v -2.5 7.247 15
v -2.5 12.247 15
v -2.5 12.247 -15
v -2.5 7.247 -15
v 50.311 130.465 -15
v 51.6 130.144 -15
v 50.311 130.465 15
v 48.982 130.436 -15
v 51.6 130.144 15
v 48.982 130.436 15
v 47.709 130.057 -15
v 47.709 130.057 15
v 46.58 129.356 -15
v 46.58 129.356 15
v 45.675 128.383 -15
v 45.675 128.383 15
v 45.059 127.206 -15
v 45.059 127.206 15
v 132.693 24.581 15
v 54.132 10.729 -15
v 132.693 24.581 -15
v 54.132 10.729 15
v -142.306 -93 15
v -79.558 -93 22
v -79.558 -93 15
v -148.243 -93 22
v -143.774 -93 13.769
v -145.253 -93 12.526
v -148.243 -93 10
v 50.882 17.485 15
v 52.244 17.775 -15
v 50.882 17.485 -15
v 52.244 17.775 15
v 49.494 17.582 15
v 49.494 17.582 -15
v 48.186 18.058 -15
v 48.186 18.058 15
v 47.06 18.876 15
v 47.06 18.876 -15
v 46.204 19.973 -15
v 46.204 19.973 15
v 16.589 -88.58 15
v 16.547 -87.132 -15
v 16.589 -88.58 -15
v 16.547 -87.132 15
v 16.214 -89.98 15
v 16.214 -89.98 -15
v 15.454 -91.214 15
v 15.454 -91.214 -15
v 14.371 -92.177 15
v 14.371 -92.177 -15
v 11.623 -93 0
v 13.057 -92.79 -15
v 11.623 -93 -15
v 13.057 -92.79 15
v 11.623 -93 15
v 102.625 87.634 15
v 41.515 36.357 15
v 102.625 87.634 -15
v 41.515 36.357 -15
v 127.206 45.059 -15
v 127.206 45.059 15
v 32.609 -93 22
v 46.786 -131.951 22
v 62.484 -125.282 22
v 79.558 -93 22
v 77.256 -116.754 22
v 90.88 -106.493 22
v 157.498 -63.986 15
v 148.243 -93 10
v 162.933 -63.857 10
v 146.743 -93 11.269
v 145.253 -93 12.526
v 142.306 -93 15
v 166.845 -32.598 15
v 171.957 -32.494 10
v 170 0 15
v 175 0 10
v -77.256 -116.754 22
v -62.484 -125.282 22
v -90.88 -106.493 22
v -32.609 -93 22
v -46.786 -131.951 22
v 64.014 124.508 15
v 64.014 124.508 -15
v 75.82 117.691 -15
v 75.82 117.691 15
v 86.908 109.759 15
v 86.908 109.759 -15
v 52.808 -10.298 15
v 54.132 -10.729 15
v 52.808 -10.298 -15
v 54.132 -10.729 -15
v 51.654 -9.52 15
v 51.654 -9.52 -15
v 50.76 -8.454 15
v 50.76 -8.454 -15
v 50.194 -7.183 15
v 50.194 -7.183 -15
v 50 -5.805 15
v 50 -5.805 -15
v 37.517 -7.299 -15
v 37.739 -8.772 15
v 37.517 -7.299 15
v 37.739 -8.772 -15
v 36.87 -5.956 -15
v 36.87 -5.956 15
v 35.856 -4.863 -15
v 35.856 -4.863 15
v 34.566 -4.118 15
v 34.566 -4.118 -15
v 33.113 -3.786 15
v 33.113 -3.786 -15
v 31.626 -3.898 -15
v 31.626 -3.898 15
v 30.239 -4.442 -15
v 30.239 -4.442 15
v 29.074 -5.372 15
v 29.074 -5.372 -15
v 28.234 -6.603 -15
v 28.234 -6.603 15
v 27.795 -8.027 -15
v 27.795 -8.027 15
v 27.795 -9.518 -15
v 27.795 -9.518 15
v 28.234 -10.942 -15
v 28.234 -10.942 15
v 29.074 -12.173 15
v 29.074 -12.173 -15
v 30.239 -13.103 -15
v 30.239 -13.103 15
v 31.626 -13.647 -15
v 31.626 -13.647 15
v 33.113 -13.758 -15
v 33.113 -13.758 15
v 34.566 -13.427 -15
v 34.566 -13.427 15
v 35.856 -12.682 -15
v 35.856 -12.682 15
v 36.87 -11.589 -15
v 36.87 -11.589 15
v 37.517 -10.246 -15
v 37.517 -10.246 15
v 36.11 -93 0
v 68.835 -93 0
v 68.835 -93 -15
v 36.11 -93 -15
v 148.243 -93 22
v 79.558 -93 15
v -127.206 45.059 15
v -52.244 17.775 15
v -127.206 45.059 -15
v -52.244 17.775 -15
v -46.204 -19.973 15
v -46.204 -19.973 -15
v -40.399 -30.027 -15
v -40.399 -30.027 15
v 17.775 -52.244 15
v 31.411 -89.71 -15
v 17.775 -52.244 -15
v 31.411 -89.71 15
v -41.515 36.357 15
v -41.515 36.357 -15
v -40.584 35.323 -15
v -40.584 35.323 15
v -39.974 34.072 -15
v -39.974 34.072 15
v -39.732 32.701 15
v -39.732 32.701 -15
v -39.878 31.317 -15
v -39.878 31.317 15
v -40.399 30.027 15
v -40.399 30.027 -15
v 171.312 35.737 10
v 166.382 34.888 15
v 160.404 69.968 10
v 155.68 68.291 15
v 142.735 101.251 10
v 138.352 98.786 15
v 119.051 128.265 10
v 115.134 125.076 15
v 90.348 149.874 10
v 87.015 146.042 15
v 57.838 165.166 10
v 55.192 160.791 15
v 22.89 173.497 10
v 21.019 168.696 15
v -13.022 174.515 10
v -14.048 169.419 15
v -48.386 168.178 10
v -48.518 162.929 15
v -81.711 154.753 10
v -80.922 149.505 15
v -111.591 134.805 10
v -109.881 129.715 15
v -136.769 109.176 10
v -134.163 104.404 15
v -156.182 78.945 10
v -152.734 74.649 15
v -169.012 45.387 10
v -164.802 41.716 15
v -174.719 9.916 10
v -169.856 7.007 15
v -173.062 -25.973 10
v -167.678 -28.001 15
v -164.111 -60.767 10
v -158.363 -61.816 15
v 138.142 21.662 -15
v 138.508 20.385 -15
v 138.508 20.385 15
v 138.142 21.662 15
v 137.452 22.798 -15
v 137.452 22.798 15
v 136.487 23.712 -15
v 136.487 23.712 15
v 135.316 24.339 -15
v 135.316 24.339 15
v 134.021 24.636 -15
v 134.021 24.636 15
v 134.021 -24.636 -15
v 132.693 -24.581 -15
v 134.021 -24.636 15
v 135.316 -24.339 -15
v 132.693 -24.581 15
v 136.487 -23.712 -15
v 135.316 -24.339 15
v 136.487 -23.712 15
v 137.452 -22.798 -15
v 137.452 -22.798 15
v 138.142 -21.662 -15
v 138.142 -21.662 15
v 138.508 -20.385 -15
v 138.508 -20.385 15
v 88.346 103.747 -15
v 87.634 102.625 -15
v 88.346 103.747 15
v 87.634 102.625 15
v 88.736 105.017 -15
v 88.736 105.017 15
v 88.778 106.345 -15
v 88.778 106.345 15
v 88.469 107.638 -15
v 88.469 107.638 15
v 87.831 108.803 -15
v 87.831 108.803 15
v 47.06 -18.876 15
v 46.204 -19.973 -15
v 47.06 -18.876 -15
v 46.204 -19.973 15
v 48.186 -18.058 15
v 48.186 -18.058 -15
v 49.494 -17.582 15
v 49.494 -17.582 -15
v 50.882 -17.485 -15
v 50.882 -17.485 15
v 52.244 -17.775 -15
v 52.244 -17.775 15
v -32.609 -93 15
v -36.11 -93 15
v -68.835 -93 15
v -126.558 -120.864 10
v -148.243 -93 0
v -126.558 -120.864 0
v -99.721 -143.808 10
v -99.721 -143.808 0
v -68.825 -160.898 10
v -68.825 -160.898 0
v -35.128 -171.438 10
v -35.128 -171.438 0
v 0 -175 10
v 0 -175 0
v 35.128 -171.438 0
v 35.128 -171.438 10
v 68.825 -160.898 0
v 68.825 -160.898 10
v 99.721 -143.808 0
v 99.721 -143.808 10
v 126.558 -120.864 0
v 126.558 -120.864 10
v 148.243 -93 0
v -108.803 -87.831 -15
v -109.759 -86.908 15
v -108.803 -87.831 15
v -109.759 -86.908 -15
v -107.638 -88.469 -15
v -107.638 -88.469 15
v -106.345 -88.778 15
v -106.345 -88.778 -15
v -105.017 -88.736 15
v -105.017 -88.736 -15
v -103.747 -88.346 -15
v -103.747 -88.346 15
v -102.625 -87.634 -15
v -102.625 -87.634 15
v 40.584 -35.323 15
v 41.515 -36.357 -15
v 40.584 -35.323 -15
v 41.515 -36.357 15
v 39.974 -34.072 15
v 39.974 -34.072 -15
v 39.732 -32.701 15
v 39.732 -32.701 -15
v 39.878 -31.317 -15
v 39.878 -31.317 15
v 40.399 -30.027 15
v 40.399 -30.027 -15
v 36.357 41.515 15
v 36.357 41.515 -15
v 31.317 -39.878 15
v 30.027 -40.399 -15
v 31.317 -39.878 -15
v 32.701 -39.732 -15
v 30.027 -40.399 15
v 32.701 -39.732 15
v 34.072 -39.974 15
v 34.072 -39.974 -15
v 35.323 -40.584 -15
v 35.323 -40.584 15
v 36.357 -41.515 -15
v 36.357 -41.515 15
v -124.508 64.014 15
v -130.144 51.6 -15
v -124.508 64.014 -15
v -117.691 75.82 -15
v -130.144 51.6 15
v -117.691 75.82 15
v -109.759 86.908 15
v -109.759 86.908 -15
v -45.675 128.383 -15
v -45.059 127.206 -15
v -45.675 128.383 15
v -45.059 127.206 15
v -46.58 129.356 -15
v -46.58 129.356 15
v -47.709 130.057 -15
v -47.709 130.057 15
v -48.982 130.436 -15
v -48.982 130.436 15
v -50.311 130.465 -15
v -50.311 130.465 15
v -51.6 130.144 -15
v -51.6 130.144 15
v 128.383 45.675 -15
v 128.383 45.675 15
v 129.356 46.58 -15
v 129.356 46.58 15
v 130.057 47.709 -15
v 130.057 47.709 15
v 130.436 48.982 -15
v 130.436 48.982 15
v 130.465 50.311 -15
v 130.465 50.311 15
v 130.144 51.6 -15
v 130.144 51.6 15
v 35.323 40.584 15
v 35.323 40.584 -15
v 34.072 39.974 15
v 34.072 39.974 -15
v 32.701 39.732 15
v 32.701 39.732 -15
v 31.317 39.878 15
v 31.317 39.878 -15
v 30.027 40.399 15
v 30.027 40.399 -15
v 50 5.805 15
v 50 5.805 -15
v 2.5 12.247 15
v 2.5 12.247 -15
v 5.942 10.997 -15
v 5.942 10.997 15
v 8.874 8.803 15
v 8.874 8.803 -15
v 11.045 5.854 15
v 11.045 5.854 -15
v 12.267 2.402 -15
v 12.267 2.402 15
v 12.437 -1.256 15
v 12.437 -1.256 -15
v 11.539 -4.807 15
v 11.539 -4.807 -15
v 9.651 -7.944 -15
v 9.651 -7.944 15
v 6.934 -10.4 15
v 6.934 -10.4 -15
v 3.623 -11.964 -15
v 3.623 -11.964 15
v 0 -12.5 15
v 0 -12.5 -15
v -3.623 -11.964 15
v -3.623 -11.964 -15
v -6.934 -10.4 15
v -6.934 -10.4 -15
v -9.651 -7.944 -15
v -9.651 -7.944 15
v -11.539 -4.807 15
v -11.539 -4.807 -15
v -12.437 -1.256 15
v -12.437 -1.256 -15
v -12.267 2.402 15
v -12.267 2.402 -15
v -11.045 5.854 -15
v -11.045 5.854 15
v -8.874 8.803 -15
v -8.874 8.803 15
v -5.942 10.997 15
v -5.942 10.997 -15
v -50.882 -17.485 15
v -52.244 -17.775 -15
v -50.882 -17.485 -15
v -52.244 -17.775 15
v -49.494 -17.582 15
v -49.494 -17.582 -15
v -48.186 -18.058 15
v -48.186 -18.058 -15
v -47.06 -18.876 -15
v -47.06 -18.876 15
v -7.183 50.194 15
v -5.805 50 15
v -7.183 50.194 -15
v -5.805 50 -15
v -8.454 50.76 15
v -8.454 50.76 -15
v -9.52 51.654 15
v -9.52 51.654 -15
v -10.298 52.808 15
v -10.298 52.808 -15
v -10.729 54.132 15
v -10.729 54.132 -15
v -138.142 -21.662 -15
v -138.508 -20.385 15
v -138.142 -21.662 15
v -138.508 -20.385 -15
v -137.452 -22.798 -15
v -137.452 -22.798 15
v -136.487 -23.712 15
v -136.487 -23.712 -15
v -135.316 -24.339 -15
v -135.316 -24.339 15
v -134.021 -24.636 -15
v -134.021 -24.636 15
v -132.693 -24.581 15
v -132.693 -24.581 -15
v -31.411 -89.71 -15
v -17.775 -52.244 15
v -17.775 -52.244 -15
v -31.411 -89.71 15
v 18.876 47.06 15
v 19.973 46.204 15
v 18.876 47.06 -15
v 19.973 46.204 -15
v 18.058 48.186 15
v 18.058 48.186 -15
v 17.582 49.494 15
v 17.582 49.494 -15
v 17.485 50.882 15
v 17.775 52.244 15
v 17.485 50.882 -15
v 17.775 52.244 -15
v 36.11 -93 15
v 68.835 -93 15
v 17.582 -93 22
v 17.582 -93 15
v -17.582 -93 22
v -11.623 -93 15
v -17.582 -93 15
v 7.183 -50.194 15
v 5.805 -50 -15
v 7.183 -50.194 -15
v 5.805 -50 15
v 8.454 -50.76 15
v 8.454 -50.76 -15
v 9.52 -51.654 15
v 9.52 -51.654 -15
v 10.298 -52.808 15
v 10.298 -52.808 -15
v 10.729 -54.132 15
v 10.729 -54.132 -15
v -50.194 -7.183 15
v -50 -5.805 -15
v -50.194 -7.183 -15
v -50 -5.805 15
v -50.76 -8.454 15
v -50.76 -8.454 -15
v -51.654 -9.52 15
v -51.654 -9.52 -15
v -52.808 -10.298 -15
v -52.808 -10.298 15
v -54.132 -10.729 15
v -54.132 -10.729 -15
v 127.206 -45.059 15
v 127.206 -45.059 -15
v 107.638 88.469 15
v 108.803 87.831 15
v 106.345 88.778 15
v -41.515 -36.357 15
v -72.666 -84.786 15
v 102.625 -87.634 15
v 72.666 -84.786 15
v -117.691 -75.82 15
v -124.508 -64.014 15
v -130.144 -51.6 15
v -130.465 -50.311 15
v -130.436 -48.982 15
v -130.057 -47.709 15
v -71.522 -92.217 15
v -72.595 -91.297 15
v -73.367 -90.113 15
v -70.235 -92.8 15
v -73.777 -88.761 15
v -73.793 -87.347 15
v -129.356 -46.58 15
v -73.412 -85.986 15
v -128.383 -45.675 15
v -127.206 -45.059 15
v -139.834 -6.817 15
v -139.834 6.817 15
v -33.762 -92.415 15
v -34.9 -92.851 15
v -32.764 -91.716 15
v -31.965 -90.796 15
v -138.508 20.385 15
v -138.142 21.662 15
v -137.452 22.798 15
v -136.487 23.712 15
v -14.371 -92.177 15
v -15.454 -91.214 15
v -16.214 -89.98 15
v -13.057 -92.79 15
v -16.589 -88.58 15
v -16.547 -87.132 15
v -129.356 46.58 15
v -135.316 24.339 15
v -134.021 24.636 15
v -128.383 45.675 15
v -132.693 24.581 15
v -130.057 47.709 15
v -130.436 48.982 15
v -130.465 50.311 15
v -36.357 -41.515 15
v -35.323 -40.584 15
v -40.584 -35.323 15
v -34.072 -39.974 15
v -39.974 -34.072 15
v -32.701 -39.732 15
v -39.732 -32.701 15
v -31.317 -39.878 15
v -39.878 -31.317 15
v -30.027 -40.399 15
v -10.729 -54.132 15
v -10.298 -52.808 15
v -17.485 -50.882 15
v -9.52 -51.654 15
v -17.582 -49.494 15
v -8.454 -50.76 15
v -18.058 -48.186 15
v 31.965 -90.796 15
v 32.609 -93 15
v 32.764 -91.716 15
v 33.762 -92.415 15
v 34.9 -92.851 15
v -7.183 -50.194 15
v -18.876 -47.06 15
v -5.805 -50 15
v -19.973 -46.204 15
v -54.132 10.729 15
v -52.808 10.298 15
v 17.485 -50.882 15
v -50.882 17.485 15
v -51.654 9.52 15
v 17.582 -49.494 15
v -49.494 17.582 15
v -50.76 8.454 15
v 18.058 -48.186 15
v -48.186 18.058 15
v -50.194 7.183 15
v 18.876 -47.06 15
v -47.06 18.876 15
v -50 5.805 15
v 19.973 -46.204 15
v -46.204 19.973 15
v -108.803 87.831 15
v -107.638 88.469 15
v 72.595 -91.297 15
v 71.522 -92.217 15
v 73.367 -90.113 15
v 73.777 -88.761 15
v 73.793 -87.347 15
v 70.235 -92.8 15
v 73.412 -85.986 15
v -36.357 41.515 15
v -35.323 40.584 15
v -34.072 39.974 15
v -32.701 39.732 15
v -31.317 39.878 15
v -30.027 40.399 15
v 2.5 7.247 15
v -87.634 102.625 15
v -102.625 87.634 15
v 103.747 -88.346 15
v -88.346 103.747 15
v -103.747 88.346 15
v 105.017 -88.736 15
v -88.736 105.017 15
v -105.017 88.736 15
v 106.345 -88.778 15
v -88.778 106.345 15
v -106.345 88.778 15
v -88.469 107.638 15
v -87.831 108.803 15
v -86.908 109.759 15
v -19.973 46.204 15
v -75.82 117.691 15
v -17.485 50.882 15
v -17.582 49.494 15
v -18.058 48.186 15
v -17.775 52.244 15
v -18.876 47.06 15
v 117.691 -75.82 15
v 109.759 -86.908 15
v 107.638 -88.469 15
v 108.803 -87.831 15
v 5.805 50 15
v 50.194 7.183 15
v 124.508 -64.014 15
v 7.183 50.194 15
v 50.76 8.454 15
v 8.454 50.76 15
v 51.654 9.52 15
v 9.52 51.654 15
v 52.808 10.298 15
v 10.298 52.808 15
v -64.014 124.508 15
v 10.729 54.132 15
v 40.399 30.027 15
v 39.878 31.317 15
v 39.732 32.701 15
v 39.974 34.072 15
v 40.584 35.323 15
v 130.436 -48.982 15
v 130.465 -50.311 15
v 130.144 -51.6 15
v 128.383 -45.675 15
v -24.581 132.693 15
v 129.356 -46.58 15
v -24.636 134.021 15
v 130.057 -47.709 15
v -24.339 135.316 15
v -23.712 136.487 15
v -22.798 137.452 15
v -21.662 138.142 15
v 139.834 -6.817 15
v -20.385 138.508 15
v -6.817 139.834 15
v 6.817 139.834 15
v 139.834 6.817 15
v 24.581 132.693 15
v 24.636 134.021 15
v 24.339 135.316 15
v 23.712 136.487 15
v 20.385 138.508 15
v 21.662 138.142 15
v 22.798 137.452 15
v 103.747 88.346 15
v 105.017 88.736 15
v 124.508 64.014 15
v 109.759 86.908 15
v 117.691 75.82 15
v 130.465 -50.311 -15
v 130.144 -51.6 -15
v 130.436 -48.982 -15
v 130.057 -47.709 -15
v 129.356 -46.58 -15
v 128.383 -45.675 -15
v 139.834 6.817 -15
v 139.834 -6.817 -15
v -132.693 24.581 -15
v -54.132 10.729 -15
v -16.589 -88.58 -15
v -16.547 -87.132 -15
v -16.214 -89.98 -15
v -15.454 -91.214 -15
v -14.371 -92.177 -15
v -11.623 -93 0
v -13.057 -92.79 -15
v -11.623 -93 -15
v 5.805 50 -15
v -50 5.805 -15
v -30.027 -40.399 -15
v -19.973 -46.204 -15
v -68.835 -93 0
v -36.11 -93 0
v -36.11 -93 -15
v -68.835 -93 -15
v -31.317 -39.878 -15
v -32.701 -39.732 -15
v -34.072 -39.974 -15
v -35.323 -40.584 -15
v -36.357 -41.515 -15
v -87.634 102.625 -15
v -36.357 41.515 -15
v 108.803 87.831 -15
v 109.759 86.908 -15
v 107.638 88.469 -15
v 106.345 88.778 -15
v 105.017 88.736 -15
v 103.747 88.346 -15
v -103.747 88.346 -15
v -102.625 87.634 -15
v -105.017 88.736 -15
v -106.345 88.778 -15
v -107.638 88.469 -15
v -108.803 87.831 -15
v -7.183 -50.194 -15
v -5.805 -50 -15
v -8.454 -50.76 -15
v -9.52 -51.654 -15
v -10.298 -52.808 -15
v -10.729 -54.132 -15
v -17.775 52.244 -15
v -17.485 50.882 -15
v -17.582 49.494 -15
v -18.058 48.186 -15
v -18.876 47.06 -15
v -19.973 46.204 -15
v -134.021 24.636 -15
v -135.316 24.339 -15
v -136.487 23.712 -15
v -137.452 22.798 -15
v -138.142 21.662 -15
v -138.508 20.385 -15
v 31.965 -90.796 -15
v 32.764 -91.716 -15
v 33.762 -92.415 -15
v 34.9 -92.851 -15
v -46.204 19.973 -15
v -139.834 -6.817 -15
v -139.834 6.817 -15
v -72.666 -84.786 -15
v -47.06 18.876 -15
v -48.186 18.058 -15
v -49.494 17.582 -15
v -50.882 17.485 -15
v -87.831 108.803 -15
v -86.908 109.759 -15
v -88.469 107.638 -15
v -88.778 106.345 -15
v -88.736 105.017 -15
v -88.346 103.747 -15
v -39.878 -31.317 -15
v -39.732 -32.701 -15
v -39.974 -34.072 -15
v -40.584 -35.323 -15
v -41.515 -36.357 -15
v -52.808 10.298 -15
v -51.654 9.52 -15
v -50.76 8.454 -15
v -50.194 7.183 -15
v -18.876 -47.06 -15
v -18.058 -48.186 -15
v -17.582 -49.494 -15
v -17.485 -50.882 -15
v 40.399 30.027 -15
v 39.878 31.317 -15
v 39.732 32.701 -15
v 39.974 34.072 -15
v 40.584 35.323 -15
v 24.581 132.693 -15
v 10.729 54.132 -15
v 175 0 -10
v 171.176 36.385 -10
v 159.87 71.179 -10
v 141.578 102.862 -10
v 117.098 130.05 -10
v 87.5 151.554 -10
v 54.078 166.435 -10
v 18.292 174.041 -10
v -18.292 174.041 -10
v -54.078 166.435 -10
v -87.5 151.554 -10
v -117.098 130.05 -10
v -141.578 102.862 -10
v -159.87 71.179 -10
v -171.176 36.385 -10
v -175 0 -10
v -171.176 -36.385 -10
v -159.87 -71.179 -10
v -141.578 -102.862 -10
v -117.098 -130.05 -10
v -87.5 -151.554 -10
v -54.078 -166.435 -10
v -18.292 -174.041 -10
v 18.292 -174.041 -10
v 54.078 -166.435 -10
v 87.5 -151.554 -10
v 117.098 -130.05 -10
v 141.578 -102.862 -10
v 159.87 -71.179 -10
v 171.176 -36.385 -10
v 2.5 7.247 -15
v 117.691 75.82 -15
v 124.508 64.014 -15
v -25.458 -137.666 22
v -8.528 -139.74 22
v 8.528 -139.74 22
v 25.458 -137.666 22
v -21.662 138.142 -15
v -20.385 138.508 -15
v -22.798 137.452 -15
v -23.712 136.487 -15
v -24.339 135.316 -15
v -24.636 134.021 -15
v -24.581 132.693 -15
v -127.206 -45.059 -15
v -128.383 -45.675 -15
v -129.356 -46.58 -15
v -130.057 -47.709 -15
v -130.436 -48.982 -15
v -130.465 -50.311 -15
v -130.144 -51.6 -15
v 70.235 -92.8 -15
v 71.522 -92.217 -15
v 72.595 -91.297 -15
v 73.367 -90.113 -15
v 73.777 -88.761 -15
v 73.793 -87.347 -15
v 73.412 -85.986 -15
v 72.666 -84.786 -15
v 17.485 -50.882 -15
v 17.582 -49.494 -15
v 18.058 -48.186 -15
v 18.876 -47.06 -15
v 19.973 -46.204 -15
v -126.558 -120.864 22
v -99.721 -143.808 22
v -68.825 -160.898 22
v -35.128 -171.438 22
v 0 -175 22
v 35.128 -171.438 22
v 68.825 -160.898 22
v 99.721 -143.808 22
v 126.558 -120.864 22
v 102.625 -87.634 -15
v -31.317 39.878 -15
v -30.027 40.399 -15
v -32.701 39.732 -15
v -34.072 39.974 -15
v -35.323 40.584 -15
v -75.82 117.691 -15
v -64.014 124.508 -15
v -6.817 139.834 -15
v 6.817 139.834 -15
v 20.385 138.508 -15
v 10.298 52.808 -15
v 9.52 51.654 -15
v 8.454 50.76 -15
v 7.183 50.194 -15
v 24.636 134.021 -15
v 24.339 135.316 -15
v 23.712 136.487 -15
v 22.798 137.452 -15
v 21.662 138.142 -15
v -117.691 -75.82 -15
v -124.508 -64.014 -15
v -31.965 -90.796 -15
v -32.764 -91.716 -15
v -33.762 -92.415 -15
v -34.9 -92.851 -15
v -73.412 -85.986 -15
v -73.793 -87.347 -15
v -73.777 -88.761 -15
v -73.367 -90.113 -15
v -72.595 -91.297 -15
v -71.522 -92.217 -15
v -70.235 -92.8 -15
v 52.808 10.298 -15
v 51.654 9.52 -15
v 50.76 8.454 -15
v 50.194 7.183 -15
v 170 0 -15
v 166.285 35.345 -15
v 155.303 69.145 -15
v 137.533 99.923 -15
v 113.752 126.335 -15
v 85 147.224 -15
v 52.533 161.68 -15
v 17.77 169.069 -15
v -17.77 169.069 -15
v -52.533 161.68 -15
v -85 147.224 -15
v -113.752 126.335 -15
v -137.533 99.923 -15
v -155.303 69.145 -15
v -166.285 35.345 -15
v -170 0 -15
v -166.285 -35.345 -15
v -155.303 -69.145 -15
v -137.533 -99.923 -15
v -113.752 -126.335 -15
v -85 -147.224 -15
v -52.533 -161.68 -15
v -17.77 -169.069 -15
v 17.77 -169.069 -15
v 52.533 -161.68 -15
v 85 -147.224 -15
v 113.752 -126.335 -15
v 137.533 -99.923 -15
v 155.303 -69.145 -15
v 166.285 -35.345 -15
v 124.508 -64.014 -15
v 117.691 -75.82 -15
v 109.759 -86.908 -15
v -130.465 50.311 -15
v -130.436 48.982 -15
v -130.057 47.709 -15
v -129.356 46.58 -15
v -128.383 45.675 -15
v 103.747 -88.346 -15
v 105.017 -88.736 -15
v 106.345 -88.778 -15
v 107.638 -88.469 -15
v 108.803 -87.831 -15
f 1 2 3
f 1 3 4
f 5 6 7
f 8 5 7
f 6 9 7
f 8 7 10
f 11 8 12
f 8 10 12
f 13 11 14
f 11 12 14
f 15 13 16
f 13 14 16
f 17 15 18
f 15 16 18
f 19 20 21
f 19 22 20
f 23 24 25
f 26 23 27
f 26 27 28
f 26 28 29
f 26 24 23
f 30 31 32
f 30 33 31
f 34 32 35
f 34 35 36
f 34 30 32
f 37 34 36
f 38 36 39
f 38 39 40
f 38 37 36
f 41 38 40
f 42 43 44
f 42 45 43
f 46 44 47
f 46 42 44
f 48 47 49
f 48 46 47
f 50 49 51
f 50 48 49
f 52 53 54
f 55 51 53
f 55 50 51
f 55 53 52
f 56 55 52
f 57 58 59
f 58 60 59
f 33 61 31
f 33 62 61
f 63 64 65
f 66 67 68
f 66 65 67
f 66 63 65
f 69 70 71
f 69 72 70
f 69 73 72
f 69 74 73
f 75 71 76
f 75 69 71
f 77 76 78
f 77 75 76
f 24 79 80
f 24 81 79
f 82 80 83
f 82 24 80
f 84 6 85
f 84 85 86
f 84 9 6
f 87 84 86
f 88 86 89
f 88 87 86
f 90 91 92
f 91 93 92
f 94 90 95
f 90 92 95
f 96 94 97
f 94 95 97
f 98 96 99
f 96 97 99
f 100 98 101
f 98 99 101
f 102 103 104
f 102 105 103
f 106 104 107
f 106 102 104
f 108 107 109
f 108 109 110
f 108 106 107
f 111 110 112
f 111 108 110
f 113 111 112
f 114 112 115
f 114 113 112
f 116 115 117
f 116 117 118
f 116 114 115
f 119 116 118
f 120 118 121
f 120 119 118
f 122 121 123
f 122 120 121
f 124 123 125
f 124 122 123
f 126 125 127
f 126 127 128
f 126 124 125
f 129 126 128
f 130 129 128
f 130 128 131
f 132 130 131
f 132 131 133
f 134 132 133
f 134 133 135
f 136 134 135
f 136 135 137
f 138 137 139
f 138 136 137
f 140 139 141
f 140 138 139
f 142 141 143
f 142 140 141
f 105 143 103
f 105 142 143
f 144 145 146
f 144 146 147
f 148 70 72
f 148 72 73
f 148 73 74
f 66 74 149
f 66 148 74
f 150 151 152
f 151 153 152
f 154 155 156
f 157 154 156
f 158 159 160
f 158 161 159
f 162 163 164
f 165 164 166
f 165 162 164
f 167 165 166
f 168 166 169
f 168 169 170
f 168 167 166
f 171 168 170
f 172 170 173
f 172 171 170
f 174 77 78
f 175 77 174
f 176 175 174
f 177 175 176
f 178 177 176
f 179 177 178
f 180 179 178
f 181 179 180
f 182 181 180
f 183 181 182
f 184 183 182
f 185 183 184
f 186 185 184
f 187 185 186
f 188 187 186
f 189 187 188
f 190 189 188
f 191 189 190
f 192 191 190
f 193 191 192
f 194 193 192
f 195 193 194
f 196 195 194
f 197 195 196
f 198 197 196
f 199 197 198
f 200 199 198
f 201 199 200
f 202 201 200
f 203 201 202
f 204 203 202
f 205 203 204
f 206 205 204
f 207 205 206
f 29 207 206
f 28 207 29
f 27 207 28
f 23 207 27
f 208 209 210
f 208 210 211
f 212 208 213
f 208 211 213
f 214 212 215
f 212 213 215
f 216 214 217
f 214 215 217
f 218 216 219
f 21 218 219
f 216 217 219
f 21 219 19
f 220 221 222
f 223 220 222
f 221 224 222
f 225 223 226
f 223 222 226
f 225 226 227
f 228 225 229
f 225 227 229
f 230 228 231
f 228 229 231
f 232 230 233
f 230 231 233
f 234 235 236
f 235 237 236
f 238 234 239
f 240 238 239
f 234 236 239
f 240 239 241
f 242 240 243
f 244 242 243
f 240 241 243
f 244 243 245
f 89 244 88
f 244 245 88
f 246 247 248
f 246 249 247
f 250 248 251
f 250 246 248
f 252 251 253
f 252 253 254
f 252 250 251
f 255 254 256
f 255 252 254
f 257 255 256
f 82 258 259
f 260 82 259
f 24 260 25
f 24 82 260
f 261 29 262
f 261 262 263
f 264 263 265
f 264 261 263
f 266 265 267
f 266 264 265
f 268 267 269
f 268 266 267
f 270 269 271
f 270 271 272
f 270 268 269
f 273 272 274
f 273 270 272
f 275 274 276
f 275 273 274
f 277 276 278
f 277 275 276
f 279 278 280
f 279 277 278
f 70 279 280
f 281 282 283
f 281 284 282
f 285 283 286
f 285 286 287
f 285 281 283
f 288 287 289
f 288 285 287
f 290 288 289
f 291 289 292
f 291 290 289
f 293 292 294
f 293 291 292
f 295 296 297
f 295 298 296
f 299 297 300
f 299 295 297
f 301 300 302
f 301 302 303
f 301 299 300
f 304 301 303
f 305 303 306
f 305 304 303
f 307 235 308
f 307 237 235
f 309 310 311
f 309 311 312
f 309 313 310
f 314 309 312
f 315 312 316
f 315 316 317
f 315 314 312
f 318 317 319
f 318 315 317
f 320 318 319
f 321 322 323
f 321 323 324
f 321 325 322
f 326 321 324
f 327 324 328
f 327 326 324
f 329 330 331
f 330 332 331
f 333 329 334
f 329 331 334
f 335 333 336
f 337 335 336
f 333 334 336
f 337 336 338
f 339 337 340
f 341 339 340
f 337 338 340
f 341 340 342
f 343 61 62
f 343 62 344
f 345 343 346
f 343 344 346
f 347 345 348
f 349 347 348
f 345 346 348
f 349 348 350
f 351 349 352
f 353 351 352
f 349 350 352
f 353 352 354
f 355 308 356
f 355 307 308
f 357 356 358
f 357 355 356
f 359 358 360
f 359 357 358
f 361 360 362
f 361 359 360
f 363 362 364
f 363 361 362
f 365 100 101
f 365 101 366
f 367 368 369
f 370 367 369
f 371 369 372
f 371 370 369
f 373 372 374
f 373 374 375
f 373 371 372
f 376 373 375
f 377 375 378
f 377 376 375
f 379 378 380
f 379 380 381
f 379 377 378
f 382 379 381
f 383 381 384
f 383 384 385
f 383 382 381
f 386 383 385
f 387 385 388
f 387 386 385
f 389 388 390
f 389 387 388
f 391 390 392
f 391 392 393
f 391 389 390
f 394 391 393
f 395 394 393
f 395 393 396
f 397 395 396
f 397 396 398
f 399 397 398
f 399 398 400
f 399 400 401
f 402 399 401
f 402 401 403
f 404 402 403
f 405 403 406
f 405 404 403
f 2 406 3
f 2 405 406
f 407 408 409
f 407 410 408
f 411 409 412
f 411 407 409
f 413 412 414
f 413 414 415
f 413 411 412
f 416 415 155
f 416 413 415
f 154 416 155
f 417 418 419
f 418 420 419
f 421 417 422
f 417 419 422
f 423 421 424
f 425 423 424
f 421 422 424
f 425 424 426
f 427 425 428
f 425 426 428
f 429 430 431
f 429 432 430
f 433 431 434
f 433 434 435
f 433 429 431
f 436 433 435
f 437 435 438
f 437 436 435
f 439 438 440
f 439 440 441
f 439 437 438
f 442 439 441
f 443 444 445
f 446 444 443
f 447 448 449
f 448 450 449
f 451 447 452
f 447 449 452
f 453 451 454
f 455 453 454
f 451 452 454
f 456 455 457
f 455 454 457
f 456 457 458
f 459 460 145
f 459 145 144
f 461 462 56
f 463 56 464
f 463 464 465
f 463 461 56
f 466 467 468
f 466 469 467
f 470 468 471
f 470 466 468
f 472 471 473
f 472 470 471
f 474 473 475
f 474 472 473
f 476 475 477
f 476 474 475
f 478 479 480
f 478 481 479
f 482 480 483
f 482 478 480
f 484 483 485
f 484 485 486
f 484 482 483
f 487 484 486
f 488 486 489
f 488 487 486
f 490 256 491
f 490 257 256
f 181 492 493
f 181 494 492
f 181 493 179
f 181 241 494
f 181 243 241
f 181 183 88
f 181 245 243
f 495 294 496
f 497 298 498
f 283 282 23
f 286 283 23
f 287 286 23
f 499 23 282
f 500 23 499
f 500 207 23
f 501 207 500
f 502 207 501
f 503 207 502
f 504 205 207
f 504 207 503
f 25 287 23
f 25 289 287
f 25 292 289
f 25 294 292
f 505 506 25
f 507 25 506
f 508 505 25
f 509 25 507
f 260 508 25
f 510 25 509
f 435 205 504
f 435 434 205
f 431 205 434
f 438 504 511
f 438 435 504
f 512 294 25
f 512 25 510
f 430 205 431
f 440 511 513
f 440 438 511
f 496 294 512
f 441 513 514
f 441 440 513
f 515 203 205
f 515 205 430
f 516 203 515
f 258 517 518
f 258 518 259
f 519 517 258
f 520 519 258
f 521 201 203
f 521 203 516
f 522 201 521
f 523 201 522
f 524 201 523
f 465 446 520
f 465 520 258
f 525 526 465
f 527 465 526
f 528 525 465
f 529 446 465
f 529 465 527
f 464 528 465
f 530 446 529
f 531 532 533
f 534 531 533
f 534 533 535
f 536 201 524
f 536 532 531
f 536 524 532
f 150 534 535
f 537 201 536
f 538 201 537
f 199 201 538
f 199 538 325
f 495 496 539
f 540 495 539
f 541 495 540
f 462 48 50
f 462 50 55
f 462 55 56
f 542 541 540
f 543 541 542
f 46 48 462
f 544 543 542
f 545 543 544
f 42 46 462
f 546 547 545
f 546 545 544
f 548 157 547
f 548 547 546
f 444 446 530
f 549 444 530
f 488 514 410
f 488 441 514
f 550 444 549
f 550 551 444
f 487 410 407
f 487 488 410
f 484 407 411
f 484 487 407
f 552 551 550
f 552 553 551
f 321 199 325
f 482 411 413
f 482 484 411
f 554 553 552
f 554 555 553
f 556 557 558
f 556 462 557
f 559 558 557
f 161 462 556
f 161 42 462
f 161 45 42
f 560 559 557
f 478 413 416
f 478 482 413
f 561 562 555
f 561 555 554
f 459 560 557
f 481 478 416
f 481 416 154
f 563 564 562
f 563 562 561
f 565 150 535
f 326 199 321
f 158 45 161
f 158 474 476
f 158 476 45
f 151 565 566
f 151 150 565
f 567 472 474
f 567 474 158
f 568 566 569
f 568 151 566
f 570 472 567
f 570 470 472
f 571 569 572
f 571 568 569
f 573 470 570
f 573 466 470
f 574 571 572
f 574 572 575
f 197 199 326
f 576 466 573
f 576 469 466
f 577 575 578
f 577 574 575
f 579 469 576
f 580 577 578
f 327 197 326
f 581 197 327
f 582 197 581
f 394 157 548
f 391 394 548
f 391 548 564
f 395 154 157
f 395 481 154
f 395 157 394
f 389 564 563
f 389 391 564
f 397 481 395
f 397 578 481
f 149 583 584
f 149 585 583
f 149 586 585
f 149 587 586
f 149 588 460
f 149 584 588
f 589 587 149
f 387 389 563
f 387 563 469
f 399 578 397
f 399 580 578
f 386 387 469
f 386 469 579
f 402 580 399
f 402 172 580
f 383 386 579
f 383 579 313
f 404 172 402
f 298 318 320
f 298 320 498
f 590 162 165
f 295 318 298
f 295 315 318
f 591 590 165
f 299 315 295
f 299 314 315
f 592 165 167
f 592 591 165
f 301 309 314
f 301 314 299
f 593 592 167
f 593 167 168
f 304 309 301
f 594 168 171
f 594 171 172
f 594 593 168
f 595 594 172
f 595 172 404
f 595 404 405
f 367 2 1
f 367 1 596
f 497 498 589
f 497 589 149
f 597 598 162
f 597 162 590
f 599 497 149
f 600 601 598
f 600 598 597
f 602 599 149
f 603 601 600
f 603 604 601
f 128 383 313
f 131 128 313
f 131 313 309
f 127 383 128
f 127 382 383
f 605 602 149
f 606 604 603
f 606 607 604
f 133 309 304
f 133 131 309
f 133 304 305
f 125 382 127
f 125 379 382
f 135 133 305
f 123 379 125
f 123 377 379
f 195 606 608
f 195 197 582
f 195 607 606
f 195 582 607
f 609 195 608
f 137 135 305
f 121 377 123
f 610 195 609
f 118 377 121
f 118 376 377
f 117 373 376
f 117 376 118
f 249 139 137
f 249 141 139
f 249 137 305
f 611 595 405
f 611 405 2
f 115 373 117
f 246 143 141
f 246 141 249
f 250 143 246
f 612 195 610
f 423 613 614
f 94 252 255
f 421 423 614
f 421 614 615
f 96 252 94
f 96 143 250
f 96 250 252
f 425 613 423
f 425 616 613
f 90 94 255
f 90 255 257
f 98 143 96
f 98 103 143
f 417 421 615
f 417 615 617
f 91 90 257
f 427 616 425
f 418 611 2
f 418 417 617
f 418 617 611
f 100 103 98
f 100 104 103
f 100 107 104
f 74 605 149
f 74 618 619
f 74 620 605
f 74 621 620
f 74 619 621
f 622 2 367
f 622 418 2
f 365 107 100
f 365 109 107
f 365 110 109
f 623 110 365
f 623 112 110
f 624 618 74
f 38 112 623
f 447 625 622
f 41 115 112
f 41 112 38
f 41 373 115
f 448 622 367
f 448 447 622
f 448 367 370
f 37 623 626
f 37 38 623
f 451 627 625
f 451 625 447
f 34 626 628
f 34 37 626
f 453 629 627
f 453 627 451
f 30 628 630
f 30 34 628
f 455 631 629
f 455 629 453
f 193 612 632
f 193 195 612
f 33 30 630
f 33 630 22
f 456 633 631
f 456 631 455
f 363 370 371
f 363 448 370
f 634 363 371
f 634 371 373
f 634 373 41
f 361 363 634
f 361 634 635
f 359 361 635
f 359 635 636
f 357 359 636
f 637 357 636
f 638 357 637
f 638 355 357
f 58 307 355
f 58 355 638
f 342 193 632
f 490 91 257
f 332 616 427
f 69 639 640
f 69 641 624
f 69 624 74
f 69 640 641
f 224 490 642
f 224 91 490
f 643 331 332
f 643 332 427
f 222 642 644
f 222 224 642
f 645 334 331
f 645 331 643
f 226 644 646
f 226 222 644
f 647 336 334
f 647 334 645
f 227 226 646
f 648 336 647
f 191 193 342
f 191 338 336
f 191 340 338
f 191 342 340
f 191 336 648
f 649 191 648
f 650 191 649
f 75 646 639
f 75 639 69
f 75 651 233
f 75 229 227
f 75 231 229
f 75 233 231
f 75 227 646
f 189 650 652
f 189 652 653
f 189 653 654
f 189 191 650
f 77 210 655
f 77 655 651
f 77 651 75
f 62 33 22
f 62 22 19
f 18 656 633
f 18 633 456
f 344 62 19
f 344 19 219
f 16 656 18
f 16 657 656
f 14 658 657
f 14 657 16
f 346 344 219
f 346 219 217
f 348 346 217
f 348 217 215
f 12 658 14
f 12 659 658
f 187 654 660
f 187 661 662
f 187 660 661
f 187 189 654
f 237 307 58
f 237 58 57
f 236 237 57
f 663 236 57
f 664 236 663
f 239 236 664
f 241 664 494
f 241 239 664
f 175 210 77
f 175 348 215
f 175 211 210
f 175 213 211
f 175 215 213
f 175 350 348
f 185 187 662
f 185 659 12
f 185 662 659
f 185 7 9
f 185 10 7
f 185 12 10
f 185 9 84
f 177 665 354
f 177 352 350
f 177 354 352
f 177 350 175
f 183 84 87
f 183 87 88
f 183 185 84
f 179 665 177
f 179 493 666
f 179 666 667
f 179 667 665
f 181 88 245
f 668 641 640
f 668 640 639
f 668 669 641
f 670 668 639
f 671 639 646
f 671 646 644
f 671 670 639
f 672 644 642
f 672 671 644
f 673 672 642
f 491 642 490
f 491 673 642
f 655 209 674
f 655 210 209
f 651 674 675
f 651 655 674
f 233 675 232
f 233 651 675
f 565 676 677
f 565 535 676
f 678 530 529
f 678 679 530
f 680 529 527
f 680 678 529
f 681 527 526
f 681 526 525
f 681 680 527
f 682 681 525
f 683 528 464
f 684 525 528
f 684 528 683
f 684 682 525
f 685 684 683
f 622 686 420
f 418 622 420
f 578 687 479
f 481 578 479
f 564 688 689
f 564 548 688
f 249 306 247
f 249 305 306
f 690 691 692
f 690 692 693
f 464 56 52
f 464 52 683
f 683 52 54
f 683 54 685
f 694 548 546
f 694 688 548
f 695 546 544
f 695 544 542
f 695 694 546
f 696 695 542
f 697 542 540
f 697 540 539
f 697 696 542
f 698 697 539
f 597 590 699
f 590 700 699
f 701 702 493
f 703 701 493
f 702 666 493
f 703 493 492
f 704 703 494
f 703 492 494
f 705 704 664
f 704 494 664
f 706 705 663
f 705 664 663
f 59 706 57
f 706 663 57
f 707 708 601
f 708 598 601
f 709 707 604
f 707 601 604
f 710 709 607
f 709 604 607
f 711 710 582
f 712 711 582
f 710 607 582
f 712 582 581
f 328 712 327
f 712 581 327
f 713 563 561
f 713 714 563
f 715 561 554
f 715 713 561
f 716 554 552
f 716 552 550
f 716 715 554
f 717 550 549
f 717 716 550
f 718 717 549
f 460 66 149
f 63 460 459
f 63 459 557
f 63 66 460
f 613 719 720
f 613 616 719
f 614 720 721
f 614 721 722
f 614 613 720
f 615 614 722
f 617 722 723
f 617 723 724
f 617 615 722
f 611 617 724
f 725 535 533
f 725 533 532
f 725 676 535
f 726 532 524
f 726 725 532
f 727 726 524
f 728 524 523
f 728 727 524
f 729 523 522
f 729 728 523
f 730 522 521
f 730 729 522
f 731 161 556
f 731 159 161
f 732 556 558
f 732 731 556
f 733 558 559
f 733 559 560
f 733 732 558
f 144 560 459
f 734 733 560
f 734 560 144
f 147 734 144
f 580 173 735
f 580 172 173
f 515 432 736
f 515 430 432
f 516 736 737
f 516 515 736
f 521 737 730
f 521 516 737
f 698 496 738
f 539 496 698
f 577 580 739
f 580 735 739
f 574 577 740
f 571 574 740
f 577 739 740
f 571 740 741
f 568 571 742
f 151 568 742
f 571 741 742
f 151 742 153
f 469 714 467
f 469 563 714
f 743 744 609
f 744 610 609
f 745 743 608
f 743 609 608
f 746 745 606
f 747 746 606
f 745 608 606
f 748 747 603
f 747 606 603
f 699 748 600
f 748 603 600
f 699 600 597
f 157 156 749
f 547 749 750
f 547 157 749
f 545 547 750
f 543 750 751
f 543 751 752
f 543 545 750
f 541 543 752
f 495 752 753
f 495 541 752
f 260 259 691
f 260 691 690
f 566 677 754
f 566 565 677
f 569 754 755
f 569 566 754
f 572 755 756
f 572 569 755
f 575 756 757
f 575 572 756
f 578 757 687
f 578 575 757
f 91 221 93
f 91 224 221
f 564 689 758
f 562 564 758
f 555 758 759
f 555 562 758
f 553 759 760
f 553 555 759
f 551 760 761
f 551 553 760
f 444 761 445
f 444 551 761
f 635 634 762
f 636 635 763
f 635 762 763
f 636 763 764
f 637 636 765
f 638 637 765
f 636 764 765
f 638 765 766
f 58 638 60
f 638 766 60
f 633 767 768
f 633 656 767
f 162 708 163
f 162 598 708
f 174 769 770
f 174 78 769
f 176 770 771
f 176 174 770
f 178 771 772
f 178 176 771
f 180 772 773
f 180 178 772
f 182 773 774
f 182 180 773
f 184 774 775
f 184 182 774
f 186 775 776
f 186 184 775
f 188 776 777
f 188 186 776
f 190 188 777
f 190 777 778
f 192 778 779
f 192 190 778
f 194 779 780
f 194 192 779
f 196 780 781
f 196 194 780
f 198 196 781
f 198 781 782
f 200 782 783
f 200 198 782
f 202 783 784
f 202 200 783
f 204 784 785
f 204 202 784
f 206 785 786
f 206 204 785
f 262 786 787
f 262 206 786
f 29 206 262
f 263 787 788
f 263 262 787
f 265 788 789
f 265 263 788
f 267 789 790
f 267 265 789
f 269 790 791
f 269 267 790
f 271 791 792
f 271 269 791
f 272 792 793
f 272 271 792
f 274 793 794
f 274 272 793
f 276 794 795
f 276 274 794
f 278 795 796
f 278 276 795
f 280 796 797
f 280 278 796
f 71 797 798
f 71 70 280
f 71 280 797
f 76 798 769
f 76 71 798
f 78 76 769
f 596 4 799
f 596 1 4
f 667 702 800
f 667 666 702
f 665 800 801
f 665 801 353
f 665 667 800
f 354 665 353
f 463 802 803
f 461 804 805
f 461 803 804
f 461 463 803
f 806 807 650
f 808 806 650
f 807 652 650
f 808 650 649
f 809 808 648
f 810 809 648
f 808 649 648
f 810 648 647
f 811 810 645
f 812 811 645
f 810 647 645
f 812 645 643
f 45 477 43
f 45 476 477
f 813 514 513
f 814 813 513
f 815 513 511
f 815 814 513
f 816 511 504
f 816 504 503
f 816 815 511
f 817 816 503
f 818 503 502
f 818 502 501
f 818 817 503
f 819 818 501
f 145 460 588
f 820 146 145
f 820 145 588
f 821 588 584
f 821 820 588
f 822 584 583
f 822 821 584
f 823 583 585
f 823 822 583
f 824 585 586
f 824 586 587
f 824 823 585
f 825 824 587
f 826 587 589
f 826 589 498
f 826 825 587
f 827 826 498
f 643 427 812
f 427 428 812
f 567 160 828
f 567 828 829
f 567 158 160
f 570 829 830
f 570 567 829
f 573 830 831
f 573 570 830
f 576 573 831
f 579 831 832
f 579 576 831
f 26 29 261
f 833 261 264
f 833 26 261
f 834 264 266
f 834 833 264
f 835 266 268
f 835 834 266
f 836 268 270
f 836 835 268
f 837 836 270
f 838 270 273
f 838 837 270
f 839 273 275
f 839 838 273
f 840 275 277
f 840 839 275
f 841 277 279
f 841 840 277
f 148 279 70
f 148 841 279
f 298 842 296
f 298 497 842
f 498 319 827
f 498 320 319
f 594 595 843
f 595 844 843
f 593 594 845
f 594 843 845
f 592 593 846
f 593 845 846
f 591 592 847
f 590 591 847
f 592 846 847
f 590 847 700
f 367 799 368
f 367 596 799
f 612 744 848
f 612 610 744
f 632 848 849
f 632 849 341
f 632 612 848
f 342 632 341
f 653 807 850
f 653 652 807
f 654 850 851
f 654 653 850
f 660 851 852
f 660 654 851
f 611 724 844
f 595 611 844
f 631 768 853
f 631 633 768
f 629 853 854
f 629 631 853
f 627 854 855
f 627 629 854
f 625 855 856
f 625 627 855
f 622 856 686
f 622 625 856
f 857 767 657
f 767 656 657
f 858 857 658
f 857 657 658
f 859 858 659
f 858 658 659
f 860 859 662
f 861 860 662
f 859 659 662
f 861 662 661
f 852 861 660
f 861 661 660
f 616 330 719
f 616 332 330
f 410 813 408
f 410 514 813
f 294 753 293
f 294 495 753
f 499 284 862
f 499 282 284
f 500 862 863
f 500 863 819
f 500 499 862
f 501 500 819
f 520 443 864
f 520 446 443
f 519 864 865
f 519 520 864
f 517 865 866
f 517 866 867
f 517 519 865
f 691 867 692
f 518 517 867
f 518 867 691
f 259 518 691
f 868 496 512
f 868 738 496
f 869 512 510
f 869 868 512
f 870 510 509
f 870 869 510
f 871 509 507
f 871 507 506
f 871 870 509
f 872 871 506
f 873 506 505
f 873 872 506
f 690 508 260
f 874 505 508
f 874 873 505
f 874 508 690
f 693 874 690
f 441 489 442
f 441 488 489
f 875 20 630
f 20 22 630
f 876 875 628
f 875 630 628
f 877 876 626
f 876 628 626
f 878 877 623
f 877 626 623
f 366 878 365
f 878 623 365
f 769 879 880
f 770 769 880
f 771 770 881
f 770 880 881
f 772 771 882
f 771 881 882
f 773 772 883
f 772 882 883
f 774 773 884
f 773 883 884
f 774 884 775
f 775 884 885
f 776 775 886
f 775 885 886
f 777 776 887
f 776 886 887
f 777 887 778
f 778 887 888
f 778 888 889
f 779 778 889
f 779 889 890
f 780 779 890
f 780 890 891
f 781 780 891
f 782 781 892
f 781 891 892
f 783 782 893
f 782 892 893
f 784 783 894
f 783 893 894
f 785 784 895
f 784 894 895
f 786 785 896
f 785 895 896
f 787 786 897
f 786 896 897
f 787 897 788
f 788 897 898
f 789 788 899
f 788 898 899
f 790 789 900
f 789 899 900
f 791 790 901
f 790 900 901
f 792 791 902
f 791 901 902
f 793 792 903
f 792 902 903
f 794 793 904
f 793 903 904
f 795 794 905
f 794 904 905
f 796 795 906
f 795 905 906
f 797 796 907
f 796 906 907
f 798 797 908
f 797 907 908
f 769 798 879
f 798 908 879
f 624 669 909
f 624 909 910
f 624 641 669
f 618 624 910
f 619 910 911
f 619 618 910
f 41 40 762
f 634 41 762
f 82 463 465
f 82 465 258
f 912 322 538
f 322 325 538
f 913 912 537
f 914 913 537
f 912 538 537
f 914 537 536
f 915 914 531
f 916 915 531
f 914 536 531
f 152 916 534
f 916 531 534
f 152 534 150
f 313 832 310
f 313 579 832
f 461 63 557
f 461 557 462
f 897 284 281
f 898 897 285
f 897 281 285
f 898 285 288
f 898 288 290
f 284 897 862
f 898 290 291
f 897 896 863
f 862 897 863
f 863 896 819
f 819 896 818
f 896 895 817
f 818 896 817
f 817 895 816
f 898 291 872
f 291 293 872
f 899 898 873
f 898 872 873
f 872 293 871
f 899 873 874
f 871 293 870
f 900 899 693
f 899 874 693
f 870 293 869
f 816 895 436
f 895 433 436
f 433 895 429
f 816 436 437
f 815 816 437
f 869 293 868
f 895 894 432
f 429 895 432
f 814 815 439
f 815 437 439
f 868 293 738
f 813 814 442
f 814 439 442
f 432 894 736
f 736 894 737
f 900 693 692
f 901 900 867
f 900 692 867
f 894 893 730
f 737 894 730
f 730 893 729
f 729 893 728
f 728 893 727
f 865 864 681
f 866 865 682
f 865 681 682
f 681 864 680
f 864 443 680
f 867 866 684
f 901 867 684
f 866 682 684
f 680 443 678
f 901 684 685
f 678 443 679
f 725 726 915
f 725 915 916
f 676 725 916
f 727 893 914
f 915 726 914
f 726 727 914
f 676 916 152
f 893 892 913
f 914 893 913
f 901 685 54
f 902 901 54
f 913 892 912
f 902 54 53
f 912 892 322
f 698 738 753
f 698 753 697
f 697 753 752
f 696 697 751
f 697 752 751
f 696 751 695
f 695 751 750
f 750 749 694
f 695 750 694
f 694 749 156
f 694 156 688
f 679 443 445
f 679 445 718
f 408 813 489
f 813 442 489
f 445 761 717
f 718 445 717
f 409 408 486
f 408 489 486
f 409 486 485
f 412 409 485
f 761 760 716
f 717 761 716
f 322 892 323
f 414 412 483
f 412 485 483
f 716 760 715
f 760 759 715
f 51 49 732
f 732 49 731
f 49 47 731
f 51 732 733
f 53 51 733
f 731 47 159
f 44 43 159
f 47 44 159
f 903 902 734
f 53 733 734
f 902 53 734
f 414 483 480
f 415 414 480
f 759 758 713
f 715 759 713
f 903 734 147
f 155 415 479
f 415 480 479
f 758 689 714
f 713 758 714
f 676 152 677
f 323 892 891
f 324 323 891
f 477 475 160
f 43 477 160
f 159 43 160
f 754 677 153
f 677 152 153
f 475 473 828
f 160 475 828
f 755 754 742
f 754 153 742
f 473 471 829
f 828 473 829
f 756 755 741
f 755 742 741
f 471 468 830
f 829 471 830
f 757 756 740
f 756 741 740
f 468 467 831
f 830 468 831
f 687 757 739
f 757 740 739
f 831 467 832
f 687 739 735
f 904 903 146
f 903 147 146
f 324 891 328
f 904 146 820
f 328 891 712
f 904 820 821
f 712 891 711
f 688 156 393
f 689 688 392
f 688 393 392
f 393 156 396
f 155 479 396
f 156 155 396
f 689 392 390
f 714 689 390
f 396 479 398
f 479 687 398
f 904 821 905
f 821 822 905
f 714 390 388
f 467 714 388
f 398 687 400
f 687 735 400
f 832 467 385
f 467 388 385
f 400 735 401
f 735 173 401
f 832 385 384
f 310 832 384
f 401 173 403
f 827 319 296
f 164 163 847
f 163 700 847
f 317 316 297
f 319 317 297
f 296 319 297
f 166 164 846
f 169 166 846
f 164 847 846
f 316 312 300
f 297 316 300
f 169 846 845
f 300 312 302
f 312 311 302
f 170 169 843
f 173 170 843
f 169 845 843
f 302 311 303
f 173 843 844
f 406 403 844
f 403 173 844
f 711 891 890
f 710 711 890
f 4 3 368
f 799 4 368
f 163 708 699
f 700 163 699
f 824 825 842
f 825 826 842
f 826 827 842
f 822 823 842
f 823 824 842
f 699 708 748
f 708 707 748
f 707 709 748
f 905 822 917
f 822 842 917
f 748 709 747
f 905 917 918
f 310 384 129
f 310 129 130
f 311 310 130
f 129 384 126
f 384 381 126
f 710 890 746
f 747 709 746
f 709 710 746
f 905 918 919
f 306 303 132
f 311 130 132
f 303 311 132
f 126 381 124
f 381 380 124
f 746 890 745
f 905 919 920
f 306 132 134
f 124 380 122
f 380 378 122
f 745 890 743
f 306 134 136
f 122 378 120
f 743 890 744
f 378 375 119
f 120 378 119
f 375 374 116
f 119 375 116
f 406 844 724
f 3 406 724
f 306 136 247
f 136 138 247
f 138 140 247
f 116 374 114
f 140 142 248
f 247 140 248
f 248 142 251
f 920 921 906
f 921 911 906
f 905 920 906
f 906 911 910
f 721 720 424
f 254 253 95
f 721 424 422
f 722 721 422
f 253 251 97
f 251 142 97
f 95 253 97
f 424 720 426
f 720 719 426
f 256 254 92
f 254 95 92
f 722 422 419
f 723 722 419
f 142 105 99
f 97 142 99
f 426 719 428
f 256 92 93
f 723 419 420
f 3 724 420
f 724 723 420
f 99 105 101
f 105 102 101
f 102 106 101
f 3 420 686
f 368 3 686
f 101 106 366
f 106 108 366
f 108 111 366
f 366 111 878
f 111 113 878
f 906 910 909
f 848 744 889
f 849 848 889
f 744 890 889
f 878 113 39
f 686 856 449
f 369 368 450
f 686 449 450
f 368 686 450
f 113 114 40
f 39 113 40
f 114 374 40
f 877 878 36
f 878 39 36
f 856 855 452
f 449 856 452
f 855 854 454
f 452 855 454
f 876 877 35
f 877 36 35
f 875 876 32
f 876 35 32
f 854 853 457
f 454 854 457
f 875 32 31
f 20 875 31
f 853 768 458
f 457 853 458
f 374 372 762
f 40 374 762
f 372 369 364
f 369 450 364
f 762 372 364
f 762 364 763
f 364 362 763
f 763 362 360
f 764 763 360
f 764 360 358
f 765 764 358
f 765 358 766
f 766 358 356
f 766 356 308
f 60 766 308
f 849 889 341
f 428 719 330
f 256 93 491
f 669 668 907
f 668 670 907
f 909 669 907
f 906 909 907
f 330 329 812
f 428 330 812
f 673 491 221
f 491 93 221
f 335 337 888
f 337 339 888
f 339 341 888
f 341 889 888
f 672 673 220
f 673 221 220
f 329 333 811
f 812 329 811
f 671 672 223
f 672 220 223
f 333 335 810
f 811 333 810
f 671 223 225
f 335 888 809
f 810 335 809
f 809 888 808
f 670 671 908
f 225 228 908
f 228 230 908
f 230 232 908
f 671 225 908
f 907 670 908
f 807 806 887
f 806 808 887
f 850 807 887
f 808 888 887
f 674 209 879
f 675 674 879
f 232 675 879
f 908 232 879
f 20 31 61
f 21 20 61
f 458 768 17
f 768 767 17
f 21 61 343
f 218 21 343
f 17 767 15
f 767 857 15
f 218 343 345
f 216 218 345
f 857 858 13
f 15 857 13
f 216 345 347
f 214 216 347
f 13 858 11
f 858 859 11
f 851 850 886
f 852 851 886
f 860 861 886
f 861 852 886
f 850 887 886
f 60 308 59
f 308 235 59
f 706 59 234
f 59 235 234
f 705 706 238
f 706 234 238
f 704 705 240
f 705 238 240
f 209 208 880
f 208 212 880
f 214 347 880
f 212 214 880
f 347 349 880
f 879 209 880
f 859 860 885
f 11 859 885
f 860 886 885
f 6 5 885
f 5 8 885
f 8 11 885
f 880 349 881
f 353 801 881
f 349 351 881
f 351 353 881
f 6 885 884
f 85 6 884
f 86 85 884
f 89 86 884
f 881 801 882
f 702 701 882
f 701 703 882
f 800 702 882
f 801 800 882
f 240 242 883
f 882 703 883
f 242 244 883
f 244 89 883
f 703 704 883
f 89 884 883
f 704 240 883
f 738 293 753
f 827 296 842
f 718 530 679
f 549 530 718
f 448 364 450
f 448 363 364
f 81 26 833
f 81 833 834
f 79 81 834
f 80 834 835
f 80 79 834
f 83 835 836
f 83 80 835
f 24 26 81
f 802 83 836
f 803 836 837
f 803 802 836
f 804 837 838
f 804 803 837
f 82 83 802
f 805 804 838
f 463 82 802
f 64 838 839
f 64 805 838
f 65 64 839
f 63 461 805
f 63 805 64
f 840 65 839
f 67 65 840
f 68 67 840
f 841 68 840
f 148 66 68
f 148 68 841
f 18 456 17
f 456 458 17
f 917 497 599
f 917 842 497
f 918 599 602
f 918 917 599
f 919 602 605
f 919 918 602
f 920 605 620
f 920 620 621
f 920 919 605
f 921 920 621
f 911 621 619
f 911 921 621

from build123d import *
from build123d.topology import SkipClean

# Parameters (mm, degrees)
SKETCH2_R           = 175
SKETCH2_R_2         = 5
BOSS_EXTRUDE1_DEPTH = 15
CHAMFER1_SIZE       = 5
FILLET1_R           = 5
FILLET2_R           = 5
BOSS_EXTRUDE2_START = 22
BOSS_EXTRUDE2_DEPTH = 22


with BuildPart() as part:
    # Sketch2 → Boss-Extrude1 (new, symmetric)
    with BuildSketch(Plane.XY):
        Circle(SKETCH2_R)
        Polygon((16.339745962, -48.301270189), (33.660254038, -38.301270189), (79.557938048, -93), (32.608753123, -93), align=None, mode=Mode.SUBTRACT)
        Polygon((10, -50), (17.58206017, -93), (-17.58206017, -93), (-10, -50), align=None, mode=Mode.SUBTRACT)
        Polygon((-16.339745962, -48.301270189), (-32.608753123, -93), (-79.557938048, -93), (-33.660254038, -38.301270189), align=None, mode=Mode.SUBTRACT)
        with BuildLine():
            Line((-50, 10), (-50, -10))
            Line((-50, -10), (-137.66589003, -25.4578617))
            ThreePointArc((-137.66589003, -25.4578617), (-140, 0), (-137.66589003, 25.4578617))
            Line((-137.66589003, 25.4578617), (-50, 10))
        make_face(mode=Mode.SUBTRACT)
        with BuildLine():
            Line((-48.301270189, -16.339745962), (-38.301270189, -33.660254038))
            Line((-38.301270189, -33.660254038), (-106.49322715, -90.880099973))
            ThreePointArc((-106.49322715, -90.880099973), (-121.24355653, -70), (-131.95108885, -46.785790057))
            Line((-131.95108885, -46.785790057), (-48.301270189, -16.339745962))
        make_face(mode=Mode.SUBTRACT)
        with BuildLine():
            Line((38.301270189, -33.660254038), (48.301270189, -16.339745962))
            Line((48.301270189, -16.339745962), (131.95108885, -46.785790057))
            ThreePointArc((131.95108885, -46.785790057), (121.24355653, -70), (106.49322715, -90.880099973))
            Line((106.49322715, -90.880099973), (38.301270189, -33.660254038))
        make_face(mode=Mode.SUBTRACT)
        with Locations((32.7390252, -8.772395363)):
            Circle(SKETCH2_R_2, mode=Mode.SUBTRACT)
        with BuildLine():
            Line((-38.301270189, 33.660254038), (-48.301270189, 16.339745962))
            Line((-48.301270189, 16.339745962), (-131.95108885, 46.785790057))
            ThreePointArc((-131.95108885, 46.785790057), (-121.24355653, 70), (-106.49322715, 90.880099973))
            Line((-106.49322715, 90.880099973), (-38.301270189, 33.660254038))
        make_face(mode=Mode.SUBTRACT)
        with BuildLine():
            Line((-16.339745962, 48.301270189), (-33.660254038, 38.301270189))
            Line((-33.660254038, 38.301270189), (-90.880099973, 106.49322715))
            ThreePointArc((-90.880099973, 106.49322715), (-70, 121.24355653), (-46.785790057, 131.95108885))
            Line((-46.785790057, 131.95108885), (-16.339745962, 48.301270189))
        make_face(mode=Mode.SUBTRACT)
        with BuildLine():
            Line((10, 50), (-10, 50))
            Line((-10, 50), (-25.4578617, 137.66589003))
            ThreePointArc((-25.4578617, 137.66589003), (0, 140), (25.4578617, 137.66589003))
            Line((25.4578617, 137.66589003), (10, 50))
        make_face(mode=Mode.SUBTRACT)
        with BuildLine():
            Line((-2.5, 12.247448714), (-2.5, 7.247448714))
            Line((-2.5, 7.247448714), (2.5, 7.247448714))
            Line((2.5, 7.247448714), (2.5, 12.247448714))
            ThreePointArc((2.5, 12.247448714), (0, -12.5), (-2.5, 12.247448714))
        make_face(mode=Mode.SUBTRACT)
        with BuildLine():
            Line((48.301270189, 16.339745962), (38.301270189, 33.660254038))
            Line((38.301270189, 33.660254038), (106.49322715, 90.880099973))
            ThreePointArc((106.49322715, 90.880099973), (121.24355653, 70), (131.95108885, 46.785790057))
            Line((131.95108885, 46.785790057), (48.301270189, 16.339745962))
        make_face(mode=Mode.SUBTRACT)
        with BuildLine():
            Line((33.660254038, 38.301270189), (16.339745962, 48.301270189))
            Line((16.339745962, 48.301270189), (46.785790057, 131.95108885))
            ThreePointArc((46.785790057, 131.95108885), (70, 121.24355653), (90.880099973, 106.49322715))
            Line((90.880099973, 106.49322715), (33.660254038, 38.301270189))
        make_face(mode=Mode.SUBTRACT)
        with BuildLine():
            Line((50, -10), (50, 10))
            Line((50, 10), (137.66589003, 25.4578617))
            ThreePointArc((137.66589003, 25.4578617), (140, 0), (137.66589003, -25.4578617))
            Line((137.66589003, -25.4578617), (50, -10))
        make_face(mode=Mode.SUBTRACT)
    extrude(amount=BOSS_EXTRUDE1_DEPTH, both=True)

    # Chamfer1
    chamfer1_edges = [part.edges().sort_by_distance(p)[0] for p in [
        (-175, 0, -15),
        (-175, 0, 15),
    ]]
    chamfer(chamfer1_edges, length=CHAMFER1_SIZE)

    # Fillet1
    fillet1_edges = [part.edges().sort_by_distance(p)[0] for p in [
        (10, 50, 0),
        (-10, 50, 0),
        (-33.660254038, -38.301270189, 0),
        (-16.339745962, -48.301270189, 0),
        (-10, -50, 0),
        (10, -50, 0),
        (16.339745962, -48.301270189, 0),
        (33.660254038, -38.301270189, 0),
        (38.301270189, -33.660254038, 0),
        (48.301270189, -16.339745962, 0),
        (50, -10, 0),
        (50, 10, 0),
        (48.301270189, 16.339745962, 0),
        (38.301270189, 33.660254038, 0),
        (33.660254038, 38.301270189, 0),
        (16.339745962, 48.301270189, 0),
        (-48.301270189, -16.339745962, 0),
        (-38.301270189, 33.660254038, 0),
        (-50, 10, 0),
        (-33.660254038, 38.301270189, 0),
        (-38.301270189, -33.660254038, 0),
        (-50, -10, 0),
        (-48.301270189, 16.339745962, 0),
        (-16.339745962, 48.301270189, 0),
    ]]
    fillet(fillet1_edges, radius=FILLET1_R)

    # Fillet2
    fillet2_edges = [part.edges().sort_by_distance(p)[0] for p in [
        (-46.785790057, 131.95108885, 0),
        (-90.880099973, 106.49322715, 0),
        (-106.49322715, 90.880099973, 0),
        (-131.95108885, 46.785790057, 0),
        (-137.66589003, 25.4578617, 0),
        (-137.66589003, -25.4578617, 0),
        (-131.95108885, -46.785790057, 0),
        (137.66589003, 25.4578617, 0),
        (106.49322715, 90.880099973, 0),
        (46.785790057, 131.95108885, 0),
        (131.95108885, -46.785790057, 0),
        (-106.49322715, -90.880099973, 0),
        (106.49322715, -90.880099973, 0),
        (137.66589003, -25.4578617, 0),
        (131.95108885, 46.785790057, 0),
        (90.880099973, 106.49322715, 0),
        (25.4578617, 137.66589003, 0),
        (-25.4578617, 137.66589003, 0),
        (-32.608753123, -93, 0),
        (-17.58206017, -93, 0),
        (17.58206017, -93, 0),
        (32.608753123, -93, 0),
        (-79.557938048, -93, 0),
        (79.557938048, -93, 0),
    ]]
    fillet(fillet2_edges, radius=FILLET2_R)

    # Sketch2<3> → Boss-Extrude2 (add)
    with SkipClean():  # the faces are left unmerged after this step: merging them gives an invalid solid
        with BuildSketch(Plane.XY.offset(BOSS_EXTRUDE2_START)):
            with BuildLine():
                Line((148.243043682, -93), (-148.243043682, -93))
                ThreePointArc((-148.243043682, -93), (0, -175), (148.243043682, -93))
            make_face()
        extrude(amount=-BOSS_EXTRUDE2_DEPTH)


solid = part.part
